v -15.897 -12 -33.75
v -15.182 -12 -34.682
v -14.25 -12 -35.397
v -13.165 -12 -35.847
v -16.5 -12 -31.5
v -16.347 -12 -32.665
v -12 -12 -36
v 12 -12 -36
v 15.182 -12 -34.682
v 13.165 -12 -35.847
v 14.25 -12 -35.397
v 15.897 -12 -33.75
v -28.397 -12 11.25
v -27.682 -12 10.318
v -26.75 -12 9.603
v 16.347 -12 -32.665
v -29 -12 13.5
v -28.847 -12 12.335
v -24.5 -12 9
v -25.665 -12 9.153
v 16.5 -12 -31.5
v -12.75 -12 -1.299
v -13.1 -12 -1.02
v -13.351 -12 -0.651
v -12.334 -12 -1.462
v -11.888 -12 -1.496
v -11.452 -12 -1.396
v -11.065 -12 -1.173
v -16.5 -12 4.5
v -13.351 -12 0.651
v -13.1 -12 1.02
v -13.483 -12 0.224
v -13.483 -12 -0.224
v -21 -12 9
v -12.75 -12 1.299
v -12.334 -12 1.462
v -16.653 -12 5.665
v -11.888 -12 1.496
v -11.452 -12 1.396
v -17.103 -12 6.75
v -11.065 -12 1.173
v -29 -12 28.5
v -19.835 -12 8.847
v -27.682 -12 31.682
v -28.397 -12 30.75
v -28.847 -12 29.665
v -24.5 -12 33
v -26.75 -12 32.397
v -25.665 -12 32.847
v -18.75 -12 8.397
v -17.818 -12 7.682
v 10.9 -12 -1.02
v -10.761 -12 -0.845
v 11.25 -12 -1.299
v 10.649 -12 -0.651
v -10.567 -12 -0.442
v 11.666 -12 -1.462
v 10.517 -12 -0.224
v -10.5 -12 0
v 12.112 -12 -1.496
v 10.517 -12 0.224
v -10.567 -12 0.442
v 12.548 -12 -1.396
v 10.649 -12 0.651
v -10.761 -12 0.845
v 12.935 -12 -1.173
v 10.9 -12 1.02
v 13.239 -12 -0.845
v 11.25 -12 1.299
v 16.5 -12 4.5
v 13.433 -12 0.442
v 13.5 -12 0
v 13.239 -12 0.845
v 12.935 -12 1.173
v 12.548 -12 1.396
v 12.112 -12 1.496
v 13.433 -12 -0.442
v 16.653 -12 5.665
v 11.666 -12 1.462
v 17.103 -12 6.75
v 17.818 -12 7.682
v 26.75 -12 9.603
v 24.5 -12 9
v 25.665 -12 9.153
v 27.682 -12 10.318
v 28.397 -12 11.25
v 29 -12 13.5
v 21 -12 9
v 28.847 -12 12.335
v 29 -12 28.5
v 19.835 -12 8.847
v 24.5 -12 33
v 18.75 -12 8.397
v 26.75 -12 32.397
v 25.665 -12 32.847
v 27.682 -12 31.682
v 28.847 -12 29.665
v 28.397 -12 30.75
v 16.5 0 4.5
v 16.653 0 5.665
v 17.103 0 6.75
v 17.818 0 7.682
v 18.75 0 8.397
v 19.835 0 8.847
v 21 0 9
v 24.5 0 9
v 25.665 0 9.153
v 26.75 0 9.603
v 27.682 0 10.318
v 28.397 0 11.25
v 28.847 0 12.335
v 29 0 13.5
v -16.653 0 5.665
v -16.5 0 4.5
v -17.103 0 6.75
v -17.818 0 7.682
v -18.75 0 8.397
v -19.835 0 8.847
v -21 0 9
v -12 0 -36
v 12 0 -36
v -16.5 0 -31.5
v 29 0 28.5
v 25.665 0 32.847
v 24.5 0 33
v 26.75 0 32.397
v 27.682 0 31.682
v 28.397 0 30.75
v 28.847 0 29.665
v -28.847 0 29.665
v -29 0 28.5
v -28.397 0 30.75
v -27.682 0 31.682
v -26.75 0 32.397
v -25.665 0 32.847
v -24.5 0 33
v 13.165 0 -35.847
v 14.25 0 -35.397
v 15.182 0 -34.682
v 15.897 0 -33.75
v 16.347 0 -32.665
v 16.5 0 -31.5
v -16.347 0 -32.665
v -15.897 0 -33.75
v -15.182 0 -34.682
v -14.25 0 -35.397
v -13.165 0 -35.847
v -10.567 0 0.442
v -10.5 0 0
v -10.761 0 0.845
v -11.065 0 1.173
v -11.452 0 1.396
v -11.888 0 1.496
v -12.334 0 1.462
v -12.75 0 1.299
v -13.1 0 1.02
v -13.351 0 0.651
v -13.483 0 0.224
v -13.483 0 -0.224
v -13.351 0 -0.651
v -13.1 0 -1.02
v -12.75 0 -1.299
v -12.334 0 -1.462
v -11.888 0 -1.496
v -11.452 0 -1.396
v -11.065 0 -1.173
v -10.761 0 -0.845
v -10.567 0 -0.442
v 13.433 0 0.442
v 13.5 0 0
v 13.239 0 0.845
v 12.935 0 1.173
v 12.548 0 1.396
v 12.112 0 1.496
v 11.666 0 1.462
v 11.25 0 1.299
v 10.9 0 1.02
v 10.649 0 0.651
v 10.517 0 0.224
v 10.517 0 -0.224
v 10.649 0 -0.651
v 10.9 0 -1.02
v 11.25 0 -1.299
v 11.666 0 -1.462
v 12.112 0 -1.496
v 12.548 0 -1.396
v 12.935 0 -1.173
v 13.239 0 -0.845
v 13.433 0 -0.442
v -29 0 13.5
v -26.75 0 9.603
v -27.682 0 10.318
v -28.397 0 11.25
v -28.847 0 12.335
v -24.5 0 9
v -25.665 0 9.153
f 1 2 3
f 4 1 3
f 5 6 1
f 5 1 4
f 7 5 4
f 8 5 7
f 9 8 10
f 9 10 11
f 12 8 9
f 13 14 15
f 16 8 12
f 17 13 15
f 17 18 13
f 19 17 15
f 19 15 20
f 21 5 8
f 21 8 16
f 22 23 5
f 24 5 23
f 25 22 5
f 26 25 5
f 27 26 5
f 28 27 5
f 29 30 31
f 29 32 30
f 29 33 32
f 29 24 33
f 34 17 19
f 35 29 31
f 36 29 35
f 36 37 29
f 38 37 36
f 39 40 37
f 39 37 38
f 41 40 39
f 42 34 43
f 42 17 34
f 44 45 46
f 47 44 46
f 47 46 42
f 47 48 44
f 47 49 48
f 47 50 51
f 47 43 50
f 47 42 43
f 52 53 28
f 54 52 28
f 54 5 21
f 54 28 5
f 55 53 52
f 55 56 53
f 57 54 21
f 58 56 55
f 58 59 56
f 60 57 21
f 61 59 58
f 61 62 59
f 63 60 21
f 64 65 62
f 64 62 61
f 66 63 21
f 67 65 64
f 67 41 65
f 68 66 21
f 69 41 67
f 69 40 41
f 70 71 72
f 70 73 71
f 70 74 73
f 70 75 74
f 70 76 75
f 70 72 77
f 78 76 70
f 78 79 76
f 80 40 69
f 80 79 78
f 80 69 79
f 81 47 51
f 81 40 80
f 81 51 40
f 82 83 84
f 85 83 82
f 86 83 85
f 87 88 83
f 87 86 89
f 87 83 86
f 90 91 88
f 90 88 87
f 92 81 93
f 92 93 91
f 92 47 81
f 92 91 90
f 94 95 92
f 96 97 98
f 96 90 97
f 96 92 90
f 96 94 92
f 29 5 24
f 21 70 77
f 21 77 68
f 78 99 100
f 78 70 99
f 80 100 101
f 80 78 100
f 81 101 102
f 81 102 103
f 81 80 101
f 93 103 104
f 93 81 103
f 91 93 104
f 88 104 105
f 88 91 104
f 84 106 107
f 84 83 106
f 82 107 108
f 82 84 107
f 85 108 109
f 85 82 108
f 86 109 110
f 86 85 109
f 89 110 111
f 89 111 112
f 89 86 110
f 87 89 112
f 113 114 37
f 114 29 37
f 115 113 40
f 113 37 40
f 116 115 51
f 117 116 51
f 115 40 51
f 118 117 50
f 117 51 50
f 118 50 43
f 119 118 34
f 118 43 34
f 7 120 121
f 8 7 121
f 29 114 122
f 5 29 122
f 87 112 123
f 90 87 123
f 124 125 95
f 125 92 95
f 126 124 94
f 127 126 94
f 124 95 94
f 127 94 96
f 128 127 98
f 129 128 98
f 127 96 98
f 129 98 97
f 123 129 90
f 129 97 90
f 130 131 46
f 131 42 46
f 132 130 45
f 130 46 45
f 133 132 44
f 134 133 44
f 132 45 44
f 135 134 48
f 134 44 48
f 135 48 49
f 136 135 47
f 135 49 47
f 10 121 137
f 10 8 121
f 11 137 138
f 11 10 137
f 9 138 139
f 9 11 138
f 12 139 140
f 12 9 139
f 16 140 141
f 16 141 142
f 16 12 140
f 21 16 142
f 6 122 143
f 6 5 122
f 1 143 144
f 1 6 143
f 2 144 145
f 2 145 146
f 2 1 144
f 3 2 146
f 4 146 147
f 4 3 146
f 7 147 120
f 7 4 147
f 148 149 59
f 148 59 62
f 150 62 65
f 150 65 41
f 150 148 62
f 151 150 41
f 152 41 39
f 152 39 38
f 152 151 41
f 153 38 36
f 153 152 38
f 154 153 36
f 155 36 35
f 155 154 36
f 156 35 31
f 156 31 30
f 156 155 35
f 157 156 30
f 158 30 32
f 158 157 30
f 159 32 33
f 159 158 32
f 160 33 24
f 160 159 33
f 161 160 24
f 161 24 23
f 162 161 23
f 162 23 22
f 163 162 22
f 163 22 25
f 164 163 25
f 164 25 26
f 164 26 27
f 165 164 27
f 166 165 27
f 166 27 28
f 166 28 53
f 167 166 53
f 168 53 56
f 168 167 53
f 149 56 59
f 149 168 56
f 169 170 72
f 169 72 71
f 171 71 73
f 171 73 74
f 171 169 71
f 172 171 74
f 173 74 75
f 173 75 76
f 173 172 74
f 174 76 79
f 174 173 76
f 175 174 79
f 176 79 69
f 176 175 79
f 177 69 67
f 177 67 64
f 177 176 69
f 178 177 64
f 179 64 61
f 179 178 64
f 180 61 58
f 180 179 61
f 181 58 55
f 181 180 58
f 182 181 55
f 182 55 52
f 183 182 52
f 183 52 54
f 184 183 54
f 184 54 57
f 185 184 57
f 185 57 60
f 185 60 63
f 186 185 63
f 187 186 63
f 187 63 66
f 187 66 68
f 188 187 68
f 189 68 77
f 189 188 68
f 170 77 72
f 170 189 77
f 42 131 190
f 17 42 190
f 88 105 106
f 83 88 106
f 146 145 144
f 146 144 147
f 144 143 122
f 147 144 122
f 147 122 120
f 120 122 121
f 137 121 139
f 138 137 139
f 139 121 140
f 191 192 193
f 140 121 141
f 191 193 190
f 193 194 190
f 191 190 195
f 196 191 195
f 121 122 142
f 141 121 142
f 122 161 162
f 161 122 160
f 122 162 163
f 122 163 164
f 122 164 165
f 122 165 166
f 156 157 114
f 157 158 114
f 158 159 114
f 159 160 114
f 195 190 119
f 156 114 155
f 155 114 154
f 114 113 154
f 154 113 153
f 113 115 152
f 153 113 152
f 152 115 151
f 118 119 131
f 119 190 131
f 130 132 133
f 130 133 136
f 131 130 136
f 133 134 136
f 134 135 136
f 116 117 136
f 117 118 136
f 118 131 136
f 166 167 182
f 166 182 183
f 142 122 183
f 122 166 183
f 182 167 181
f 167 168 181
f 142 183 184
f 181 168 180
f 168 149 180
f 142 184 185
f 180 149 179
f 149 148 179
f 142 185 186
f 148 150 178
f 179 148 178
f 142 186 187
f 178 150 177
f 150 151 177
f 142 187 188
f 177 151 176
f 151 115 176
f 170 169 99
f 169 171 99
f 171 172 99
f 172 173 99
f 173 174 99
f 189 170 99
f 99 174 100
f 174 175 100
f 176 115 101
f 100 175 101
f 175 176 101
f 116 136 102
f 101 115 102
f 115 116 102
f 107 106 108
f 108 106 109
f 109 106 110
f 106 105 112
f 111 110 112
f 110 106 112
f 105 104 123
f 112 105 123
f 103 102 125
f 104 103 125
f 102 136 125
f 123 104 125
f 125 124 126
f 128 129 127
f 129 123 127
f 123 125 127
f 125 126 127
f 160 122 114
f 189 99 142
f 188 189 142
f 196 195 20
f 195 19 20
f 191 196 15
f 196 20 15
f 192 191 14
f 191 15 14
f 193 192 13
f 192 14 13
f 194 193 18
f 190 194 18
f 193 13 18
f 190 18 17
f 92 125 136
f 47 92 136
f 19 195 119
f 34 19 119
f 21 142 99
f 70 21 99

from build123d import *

# Parameters (mm, degrees)
F0_R     = 1.5
F1_DEPTH = 12
F2_R     = 4.5


with BuildPart() as f1:
    # F0 (on Front) → F1 (new body)
    with BuildSketch(Plane.XZ):
        Polygon((-16.5, 9), (-16.5, -36), (16.5, -36), (16.5, 9), (29, 9), (29, 33), (-29, 33), (-29, 9), align=None)
        with Locations((-12, 0)):
            Circle(F0_R, mode=Mode.SUBTRACT)
        with Locations((12, 0)):
            Circle(F0_R, mode=Mode.SUBTRACT)
    extrude(amount=F1_DEPTH)

    # F2
    f2_edges = [f1.edges().sort_by_distance(p)[0] for p in [
        (-29, -6, 33),
        (-29, -6, 9),
        (-16.5, -6, 9),
        (-16.5, -6, -36),
        (16.5, -6, -36),
        (16.5, -6, 9),
        (29, -6, 9),
        (29, -6, 33),
    ]]
    fillet(f2_edges, radius=F2_R)


solid = f1.part
